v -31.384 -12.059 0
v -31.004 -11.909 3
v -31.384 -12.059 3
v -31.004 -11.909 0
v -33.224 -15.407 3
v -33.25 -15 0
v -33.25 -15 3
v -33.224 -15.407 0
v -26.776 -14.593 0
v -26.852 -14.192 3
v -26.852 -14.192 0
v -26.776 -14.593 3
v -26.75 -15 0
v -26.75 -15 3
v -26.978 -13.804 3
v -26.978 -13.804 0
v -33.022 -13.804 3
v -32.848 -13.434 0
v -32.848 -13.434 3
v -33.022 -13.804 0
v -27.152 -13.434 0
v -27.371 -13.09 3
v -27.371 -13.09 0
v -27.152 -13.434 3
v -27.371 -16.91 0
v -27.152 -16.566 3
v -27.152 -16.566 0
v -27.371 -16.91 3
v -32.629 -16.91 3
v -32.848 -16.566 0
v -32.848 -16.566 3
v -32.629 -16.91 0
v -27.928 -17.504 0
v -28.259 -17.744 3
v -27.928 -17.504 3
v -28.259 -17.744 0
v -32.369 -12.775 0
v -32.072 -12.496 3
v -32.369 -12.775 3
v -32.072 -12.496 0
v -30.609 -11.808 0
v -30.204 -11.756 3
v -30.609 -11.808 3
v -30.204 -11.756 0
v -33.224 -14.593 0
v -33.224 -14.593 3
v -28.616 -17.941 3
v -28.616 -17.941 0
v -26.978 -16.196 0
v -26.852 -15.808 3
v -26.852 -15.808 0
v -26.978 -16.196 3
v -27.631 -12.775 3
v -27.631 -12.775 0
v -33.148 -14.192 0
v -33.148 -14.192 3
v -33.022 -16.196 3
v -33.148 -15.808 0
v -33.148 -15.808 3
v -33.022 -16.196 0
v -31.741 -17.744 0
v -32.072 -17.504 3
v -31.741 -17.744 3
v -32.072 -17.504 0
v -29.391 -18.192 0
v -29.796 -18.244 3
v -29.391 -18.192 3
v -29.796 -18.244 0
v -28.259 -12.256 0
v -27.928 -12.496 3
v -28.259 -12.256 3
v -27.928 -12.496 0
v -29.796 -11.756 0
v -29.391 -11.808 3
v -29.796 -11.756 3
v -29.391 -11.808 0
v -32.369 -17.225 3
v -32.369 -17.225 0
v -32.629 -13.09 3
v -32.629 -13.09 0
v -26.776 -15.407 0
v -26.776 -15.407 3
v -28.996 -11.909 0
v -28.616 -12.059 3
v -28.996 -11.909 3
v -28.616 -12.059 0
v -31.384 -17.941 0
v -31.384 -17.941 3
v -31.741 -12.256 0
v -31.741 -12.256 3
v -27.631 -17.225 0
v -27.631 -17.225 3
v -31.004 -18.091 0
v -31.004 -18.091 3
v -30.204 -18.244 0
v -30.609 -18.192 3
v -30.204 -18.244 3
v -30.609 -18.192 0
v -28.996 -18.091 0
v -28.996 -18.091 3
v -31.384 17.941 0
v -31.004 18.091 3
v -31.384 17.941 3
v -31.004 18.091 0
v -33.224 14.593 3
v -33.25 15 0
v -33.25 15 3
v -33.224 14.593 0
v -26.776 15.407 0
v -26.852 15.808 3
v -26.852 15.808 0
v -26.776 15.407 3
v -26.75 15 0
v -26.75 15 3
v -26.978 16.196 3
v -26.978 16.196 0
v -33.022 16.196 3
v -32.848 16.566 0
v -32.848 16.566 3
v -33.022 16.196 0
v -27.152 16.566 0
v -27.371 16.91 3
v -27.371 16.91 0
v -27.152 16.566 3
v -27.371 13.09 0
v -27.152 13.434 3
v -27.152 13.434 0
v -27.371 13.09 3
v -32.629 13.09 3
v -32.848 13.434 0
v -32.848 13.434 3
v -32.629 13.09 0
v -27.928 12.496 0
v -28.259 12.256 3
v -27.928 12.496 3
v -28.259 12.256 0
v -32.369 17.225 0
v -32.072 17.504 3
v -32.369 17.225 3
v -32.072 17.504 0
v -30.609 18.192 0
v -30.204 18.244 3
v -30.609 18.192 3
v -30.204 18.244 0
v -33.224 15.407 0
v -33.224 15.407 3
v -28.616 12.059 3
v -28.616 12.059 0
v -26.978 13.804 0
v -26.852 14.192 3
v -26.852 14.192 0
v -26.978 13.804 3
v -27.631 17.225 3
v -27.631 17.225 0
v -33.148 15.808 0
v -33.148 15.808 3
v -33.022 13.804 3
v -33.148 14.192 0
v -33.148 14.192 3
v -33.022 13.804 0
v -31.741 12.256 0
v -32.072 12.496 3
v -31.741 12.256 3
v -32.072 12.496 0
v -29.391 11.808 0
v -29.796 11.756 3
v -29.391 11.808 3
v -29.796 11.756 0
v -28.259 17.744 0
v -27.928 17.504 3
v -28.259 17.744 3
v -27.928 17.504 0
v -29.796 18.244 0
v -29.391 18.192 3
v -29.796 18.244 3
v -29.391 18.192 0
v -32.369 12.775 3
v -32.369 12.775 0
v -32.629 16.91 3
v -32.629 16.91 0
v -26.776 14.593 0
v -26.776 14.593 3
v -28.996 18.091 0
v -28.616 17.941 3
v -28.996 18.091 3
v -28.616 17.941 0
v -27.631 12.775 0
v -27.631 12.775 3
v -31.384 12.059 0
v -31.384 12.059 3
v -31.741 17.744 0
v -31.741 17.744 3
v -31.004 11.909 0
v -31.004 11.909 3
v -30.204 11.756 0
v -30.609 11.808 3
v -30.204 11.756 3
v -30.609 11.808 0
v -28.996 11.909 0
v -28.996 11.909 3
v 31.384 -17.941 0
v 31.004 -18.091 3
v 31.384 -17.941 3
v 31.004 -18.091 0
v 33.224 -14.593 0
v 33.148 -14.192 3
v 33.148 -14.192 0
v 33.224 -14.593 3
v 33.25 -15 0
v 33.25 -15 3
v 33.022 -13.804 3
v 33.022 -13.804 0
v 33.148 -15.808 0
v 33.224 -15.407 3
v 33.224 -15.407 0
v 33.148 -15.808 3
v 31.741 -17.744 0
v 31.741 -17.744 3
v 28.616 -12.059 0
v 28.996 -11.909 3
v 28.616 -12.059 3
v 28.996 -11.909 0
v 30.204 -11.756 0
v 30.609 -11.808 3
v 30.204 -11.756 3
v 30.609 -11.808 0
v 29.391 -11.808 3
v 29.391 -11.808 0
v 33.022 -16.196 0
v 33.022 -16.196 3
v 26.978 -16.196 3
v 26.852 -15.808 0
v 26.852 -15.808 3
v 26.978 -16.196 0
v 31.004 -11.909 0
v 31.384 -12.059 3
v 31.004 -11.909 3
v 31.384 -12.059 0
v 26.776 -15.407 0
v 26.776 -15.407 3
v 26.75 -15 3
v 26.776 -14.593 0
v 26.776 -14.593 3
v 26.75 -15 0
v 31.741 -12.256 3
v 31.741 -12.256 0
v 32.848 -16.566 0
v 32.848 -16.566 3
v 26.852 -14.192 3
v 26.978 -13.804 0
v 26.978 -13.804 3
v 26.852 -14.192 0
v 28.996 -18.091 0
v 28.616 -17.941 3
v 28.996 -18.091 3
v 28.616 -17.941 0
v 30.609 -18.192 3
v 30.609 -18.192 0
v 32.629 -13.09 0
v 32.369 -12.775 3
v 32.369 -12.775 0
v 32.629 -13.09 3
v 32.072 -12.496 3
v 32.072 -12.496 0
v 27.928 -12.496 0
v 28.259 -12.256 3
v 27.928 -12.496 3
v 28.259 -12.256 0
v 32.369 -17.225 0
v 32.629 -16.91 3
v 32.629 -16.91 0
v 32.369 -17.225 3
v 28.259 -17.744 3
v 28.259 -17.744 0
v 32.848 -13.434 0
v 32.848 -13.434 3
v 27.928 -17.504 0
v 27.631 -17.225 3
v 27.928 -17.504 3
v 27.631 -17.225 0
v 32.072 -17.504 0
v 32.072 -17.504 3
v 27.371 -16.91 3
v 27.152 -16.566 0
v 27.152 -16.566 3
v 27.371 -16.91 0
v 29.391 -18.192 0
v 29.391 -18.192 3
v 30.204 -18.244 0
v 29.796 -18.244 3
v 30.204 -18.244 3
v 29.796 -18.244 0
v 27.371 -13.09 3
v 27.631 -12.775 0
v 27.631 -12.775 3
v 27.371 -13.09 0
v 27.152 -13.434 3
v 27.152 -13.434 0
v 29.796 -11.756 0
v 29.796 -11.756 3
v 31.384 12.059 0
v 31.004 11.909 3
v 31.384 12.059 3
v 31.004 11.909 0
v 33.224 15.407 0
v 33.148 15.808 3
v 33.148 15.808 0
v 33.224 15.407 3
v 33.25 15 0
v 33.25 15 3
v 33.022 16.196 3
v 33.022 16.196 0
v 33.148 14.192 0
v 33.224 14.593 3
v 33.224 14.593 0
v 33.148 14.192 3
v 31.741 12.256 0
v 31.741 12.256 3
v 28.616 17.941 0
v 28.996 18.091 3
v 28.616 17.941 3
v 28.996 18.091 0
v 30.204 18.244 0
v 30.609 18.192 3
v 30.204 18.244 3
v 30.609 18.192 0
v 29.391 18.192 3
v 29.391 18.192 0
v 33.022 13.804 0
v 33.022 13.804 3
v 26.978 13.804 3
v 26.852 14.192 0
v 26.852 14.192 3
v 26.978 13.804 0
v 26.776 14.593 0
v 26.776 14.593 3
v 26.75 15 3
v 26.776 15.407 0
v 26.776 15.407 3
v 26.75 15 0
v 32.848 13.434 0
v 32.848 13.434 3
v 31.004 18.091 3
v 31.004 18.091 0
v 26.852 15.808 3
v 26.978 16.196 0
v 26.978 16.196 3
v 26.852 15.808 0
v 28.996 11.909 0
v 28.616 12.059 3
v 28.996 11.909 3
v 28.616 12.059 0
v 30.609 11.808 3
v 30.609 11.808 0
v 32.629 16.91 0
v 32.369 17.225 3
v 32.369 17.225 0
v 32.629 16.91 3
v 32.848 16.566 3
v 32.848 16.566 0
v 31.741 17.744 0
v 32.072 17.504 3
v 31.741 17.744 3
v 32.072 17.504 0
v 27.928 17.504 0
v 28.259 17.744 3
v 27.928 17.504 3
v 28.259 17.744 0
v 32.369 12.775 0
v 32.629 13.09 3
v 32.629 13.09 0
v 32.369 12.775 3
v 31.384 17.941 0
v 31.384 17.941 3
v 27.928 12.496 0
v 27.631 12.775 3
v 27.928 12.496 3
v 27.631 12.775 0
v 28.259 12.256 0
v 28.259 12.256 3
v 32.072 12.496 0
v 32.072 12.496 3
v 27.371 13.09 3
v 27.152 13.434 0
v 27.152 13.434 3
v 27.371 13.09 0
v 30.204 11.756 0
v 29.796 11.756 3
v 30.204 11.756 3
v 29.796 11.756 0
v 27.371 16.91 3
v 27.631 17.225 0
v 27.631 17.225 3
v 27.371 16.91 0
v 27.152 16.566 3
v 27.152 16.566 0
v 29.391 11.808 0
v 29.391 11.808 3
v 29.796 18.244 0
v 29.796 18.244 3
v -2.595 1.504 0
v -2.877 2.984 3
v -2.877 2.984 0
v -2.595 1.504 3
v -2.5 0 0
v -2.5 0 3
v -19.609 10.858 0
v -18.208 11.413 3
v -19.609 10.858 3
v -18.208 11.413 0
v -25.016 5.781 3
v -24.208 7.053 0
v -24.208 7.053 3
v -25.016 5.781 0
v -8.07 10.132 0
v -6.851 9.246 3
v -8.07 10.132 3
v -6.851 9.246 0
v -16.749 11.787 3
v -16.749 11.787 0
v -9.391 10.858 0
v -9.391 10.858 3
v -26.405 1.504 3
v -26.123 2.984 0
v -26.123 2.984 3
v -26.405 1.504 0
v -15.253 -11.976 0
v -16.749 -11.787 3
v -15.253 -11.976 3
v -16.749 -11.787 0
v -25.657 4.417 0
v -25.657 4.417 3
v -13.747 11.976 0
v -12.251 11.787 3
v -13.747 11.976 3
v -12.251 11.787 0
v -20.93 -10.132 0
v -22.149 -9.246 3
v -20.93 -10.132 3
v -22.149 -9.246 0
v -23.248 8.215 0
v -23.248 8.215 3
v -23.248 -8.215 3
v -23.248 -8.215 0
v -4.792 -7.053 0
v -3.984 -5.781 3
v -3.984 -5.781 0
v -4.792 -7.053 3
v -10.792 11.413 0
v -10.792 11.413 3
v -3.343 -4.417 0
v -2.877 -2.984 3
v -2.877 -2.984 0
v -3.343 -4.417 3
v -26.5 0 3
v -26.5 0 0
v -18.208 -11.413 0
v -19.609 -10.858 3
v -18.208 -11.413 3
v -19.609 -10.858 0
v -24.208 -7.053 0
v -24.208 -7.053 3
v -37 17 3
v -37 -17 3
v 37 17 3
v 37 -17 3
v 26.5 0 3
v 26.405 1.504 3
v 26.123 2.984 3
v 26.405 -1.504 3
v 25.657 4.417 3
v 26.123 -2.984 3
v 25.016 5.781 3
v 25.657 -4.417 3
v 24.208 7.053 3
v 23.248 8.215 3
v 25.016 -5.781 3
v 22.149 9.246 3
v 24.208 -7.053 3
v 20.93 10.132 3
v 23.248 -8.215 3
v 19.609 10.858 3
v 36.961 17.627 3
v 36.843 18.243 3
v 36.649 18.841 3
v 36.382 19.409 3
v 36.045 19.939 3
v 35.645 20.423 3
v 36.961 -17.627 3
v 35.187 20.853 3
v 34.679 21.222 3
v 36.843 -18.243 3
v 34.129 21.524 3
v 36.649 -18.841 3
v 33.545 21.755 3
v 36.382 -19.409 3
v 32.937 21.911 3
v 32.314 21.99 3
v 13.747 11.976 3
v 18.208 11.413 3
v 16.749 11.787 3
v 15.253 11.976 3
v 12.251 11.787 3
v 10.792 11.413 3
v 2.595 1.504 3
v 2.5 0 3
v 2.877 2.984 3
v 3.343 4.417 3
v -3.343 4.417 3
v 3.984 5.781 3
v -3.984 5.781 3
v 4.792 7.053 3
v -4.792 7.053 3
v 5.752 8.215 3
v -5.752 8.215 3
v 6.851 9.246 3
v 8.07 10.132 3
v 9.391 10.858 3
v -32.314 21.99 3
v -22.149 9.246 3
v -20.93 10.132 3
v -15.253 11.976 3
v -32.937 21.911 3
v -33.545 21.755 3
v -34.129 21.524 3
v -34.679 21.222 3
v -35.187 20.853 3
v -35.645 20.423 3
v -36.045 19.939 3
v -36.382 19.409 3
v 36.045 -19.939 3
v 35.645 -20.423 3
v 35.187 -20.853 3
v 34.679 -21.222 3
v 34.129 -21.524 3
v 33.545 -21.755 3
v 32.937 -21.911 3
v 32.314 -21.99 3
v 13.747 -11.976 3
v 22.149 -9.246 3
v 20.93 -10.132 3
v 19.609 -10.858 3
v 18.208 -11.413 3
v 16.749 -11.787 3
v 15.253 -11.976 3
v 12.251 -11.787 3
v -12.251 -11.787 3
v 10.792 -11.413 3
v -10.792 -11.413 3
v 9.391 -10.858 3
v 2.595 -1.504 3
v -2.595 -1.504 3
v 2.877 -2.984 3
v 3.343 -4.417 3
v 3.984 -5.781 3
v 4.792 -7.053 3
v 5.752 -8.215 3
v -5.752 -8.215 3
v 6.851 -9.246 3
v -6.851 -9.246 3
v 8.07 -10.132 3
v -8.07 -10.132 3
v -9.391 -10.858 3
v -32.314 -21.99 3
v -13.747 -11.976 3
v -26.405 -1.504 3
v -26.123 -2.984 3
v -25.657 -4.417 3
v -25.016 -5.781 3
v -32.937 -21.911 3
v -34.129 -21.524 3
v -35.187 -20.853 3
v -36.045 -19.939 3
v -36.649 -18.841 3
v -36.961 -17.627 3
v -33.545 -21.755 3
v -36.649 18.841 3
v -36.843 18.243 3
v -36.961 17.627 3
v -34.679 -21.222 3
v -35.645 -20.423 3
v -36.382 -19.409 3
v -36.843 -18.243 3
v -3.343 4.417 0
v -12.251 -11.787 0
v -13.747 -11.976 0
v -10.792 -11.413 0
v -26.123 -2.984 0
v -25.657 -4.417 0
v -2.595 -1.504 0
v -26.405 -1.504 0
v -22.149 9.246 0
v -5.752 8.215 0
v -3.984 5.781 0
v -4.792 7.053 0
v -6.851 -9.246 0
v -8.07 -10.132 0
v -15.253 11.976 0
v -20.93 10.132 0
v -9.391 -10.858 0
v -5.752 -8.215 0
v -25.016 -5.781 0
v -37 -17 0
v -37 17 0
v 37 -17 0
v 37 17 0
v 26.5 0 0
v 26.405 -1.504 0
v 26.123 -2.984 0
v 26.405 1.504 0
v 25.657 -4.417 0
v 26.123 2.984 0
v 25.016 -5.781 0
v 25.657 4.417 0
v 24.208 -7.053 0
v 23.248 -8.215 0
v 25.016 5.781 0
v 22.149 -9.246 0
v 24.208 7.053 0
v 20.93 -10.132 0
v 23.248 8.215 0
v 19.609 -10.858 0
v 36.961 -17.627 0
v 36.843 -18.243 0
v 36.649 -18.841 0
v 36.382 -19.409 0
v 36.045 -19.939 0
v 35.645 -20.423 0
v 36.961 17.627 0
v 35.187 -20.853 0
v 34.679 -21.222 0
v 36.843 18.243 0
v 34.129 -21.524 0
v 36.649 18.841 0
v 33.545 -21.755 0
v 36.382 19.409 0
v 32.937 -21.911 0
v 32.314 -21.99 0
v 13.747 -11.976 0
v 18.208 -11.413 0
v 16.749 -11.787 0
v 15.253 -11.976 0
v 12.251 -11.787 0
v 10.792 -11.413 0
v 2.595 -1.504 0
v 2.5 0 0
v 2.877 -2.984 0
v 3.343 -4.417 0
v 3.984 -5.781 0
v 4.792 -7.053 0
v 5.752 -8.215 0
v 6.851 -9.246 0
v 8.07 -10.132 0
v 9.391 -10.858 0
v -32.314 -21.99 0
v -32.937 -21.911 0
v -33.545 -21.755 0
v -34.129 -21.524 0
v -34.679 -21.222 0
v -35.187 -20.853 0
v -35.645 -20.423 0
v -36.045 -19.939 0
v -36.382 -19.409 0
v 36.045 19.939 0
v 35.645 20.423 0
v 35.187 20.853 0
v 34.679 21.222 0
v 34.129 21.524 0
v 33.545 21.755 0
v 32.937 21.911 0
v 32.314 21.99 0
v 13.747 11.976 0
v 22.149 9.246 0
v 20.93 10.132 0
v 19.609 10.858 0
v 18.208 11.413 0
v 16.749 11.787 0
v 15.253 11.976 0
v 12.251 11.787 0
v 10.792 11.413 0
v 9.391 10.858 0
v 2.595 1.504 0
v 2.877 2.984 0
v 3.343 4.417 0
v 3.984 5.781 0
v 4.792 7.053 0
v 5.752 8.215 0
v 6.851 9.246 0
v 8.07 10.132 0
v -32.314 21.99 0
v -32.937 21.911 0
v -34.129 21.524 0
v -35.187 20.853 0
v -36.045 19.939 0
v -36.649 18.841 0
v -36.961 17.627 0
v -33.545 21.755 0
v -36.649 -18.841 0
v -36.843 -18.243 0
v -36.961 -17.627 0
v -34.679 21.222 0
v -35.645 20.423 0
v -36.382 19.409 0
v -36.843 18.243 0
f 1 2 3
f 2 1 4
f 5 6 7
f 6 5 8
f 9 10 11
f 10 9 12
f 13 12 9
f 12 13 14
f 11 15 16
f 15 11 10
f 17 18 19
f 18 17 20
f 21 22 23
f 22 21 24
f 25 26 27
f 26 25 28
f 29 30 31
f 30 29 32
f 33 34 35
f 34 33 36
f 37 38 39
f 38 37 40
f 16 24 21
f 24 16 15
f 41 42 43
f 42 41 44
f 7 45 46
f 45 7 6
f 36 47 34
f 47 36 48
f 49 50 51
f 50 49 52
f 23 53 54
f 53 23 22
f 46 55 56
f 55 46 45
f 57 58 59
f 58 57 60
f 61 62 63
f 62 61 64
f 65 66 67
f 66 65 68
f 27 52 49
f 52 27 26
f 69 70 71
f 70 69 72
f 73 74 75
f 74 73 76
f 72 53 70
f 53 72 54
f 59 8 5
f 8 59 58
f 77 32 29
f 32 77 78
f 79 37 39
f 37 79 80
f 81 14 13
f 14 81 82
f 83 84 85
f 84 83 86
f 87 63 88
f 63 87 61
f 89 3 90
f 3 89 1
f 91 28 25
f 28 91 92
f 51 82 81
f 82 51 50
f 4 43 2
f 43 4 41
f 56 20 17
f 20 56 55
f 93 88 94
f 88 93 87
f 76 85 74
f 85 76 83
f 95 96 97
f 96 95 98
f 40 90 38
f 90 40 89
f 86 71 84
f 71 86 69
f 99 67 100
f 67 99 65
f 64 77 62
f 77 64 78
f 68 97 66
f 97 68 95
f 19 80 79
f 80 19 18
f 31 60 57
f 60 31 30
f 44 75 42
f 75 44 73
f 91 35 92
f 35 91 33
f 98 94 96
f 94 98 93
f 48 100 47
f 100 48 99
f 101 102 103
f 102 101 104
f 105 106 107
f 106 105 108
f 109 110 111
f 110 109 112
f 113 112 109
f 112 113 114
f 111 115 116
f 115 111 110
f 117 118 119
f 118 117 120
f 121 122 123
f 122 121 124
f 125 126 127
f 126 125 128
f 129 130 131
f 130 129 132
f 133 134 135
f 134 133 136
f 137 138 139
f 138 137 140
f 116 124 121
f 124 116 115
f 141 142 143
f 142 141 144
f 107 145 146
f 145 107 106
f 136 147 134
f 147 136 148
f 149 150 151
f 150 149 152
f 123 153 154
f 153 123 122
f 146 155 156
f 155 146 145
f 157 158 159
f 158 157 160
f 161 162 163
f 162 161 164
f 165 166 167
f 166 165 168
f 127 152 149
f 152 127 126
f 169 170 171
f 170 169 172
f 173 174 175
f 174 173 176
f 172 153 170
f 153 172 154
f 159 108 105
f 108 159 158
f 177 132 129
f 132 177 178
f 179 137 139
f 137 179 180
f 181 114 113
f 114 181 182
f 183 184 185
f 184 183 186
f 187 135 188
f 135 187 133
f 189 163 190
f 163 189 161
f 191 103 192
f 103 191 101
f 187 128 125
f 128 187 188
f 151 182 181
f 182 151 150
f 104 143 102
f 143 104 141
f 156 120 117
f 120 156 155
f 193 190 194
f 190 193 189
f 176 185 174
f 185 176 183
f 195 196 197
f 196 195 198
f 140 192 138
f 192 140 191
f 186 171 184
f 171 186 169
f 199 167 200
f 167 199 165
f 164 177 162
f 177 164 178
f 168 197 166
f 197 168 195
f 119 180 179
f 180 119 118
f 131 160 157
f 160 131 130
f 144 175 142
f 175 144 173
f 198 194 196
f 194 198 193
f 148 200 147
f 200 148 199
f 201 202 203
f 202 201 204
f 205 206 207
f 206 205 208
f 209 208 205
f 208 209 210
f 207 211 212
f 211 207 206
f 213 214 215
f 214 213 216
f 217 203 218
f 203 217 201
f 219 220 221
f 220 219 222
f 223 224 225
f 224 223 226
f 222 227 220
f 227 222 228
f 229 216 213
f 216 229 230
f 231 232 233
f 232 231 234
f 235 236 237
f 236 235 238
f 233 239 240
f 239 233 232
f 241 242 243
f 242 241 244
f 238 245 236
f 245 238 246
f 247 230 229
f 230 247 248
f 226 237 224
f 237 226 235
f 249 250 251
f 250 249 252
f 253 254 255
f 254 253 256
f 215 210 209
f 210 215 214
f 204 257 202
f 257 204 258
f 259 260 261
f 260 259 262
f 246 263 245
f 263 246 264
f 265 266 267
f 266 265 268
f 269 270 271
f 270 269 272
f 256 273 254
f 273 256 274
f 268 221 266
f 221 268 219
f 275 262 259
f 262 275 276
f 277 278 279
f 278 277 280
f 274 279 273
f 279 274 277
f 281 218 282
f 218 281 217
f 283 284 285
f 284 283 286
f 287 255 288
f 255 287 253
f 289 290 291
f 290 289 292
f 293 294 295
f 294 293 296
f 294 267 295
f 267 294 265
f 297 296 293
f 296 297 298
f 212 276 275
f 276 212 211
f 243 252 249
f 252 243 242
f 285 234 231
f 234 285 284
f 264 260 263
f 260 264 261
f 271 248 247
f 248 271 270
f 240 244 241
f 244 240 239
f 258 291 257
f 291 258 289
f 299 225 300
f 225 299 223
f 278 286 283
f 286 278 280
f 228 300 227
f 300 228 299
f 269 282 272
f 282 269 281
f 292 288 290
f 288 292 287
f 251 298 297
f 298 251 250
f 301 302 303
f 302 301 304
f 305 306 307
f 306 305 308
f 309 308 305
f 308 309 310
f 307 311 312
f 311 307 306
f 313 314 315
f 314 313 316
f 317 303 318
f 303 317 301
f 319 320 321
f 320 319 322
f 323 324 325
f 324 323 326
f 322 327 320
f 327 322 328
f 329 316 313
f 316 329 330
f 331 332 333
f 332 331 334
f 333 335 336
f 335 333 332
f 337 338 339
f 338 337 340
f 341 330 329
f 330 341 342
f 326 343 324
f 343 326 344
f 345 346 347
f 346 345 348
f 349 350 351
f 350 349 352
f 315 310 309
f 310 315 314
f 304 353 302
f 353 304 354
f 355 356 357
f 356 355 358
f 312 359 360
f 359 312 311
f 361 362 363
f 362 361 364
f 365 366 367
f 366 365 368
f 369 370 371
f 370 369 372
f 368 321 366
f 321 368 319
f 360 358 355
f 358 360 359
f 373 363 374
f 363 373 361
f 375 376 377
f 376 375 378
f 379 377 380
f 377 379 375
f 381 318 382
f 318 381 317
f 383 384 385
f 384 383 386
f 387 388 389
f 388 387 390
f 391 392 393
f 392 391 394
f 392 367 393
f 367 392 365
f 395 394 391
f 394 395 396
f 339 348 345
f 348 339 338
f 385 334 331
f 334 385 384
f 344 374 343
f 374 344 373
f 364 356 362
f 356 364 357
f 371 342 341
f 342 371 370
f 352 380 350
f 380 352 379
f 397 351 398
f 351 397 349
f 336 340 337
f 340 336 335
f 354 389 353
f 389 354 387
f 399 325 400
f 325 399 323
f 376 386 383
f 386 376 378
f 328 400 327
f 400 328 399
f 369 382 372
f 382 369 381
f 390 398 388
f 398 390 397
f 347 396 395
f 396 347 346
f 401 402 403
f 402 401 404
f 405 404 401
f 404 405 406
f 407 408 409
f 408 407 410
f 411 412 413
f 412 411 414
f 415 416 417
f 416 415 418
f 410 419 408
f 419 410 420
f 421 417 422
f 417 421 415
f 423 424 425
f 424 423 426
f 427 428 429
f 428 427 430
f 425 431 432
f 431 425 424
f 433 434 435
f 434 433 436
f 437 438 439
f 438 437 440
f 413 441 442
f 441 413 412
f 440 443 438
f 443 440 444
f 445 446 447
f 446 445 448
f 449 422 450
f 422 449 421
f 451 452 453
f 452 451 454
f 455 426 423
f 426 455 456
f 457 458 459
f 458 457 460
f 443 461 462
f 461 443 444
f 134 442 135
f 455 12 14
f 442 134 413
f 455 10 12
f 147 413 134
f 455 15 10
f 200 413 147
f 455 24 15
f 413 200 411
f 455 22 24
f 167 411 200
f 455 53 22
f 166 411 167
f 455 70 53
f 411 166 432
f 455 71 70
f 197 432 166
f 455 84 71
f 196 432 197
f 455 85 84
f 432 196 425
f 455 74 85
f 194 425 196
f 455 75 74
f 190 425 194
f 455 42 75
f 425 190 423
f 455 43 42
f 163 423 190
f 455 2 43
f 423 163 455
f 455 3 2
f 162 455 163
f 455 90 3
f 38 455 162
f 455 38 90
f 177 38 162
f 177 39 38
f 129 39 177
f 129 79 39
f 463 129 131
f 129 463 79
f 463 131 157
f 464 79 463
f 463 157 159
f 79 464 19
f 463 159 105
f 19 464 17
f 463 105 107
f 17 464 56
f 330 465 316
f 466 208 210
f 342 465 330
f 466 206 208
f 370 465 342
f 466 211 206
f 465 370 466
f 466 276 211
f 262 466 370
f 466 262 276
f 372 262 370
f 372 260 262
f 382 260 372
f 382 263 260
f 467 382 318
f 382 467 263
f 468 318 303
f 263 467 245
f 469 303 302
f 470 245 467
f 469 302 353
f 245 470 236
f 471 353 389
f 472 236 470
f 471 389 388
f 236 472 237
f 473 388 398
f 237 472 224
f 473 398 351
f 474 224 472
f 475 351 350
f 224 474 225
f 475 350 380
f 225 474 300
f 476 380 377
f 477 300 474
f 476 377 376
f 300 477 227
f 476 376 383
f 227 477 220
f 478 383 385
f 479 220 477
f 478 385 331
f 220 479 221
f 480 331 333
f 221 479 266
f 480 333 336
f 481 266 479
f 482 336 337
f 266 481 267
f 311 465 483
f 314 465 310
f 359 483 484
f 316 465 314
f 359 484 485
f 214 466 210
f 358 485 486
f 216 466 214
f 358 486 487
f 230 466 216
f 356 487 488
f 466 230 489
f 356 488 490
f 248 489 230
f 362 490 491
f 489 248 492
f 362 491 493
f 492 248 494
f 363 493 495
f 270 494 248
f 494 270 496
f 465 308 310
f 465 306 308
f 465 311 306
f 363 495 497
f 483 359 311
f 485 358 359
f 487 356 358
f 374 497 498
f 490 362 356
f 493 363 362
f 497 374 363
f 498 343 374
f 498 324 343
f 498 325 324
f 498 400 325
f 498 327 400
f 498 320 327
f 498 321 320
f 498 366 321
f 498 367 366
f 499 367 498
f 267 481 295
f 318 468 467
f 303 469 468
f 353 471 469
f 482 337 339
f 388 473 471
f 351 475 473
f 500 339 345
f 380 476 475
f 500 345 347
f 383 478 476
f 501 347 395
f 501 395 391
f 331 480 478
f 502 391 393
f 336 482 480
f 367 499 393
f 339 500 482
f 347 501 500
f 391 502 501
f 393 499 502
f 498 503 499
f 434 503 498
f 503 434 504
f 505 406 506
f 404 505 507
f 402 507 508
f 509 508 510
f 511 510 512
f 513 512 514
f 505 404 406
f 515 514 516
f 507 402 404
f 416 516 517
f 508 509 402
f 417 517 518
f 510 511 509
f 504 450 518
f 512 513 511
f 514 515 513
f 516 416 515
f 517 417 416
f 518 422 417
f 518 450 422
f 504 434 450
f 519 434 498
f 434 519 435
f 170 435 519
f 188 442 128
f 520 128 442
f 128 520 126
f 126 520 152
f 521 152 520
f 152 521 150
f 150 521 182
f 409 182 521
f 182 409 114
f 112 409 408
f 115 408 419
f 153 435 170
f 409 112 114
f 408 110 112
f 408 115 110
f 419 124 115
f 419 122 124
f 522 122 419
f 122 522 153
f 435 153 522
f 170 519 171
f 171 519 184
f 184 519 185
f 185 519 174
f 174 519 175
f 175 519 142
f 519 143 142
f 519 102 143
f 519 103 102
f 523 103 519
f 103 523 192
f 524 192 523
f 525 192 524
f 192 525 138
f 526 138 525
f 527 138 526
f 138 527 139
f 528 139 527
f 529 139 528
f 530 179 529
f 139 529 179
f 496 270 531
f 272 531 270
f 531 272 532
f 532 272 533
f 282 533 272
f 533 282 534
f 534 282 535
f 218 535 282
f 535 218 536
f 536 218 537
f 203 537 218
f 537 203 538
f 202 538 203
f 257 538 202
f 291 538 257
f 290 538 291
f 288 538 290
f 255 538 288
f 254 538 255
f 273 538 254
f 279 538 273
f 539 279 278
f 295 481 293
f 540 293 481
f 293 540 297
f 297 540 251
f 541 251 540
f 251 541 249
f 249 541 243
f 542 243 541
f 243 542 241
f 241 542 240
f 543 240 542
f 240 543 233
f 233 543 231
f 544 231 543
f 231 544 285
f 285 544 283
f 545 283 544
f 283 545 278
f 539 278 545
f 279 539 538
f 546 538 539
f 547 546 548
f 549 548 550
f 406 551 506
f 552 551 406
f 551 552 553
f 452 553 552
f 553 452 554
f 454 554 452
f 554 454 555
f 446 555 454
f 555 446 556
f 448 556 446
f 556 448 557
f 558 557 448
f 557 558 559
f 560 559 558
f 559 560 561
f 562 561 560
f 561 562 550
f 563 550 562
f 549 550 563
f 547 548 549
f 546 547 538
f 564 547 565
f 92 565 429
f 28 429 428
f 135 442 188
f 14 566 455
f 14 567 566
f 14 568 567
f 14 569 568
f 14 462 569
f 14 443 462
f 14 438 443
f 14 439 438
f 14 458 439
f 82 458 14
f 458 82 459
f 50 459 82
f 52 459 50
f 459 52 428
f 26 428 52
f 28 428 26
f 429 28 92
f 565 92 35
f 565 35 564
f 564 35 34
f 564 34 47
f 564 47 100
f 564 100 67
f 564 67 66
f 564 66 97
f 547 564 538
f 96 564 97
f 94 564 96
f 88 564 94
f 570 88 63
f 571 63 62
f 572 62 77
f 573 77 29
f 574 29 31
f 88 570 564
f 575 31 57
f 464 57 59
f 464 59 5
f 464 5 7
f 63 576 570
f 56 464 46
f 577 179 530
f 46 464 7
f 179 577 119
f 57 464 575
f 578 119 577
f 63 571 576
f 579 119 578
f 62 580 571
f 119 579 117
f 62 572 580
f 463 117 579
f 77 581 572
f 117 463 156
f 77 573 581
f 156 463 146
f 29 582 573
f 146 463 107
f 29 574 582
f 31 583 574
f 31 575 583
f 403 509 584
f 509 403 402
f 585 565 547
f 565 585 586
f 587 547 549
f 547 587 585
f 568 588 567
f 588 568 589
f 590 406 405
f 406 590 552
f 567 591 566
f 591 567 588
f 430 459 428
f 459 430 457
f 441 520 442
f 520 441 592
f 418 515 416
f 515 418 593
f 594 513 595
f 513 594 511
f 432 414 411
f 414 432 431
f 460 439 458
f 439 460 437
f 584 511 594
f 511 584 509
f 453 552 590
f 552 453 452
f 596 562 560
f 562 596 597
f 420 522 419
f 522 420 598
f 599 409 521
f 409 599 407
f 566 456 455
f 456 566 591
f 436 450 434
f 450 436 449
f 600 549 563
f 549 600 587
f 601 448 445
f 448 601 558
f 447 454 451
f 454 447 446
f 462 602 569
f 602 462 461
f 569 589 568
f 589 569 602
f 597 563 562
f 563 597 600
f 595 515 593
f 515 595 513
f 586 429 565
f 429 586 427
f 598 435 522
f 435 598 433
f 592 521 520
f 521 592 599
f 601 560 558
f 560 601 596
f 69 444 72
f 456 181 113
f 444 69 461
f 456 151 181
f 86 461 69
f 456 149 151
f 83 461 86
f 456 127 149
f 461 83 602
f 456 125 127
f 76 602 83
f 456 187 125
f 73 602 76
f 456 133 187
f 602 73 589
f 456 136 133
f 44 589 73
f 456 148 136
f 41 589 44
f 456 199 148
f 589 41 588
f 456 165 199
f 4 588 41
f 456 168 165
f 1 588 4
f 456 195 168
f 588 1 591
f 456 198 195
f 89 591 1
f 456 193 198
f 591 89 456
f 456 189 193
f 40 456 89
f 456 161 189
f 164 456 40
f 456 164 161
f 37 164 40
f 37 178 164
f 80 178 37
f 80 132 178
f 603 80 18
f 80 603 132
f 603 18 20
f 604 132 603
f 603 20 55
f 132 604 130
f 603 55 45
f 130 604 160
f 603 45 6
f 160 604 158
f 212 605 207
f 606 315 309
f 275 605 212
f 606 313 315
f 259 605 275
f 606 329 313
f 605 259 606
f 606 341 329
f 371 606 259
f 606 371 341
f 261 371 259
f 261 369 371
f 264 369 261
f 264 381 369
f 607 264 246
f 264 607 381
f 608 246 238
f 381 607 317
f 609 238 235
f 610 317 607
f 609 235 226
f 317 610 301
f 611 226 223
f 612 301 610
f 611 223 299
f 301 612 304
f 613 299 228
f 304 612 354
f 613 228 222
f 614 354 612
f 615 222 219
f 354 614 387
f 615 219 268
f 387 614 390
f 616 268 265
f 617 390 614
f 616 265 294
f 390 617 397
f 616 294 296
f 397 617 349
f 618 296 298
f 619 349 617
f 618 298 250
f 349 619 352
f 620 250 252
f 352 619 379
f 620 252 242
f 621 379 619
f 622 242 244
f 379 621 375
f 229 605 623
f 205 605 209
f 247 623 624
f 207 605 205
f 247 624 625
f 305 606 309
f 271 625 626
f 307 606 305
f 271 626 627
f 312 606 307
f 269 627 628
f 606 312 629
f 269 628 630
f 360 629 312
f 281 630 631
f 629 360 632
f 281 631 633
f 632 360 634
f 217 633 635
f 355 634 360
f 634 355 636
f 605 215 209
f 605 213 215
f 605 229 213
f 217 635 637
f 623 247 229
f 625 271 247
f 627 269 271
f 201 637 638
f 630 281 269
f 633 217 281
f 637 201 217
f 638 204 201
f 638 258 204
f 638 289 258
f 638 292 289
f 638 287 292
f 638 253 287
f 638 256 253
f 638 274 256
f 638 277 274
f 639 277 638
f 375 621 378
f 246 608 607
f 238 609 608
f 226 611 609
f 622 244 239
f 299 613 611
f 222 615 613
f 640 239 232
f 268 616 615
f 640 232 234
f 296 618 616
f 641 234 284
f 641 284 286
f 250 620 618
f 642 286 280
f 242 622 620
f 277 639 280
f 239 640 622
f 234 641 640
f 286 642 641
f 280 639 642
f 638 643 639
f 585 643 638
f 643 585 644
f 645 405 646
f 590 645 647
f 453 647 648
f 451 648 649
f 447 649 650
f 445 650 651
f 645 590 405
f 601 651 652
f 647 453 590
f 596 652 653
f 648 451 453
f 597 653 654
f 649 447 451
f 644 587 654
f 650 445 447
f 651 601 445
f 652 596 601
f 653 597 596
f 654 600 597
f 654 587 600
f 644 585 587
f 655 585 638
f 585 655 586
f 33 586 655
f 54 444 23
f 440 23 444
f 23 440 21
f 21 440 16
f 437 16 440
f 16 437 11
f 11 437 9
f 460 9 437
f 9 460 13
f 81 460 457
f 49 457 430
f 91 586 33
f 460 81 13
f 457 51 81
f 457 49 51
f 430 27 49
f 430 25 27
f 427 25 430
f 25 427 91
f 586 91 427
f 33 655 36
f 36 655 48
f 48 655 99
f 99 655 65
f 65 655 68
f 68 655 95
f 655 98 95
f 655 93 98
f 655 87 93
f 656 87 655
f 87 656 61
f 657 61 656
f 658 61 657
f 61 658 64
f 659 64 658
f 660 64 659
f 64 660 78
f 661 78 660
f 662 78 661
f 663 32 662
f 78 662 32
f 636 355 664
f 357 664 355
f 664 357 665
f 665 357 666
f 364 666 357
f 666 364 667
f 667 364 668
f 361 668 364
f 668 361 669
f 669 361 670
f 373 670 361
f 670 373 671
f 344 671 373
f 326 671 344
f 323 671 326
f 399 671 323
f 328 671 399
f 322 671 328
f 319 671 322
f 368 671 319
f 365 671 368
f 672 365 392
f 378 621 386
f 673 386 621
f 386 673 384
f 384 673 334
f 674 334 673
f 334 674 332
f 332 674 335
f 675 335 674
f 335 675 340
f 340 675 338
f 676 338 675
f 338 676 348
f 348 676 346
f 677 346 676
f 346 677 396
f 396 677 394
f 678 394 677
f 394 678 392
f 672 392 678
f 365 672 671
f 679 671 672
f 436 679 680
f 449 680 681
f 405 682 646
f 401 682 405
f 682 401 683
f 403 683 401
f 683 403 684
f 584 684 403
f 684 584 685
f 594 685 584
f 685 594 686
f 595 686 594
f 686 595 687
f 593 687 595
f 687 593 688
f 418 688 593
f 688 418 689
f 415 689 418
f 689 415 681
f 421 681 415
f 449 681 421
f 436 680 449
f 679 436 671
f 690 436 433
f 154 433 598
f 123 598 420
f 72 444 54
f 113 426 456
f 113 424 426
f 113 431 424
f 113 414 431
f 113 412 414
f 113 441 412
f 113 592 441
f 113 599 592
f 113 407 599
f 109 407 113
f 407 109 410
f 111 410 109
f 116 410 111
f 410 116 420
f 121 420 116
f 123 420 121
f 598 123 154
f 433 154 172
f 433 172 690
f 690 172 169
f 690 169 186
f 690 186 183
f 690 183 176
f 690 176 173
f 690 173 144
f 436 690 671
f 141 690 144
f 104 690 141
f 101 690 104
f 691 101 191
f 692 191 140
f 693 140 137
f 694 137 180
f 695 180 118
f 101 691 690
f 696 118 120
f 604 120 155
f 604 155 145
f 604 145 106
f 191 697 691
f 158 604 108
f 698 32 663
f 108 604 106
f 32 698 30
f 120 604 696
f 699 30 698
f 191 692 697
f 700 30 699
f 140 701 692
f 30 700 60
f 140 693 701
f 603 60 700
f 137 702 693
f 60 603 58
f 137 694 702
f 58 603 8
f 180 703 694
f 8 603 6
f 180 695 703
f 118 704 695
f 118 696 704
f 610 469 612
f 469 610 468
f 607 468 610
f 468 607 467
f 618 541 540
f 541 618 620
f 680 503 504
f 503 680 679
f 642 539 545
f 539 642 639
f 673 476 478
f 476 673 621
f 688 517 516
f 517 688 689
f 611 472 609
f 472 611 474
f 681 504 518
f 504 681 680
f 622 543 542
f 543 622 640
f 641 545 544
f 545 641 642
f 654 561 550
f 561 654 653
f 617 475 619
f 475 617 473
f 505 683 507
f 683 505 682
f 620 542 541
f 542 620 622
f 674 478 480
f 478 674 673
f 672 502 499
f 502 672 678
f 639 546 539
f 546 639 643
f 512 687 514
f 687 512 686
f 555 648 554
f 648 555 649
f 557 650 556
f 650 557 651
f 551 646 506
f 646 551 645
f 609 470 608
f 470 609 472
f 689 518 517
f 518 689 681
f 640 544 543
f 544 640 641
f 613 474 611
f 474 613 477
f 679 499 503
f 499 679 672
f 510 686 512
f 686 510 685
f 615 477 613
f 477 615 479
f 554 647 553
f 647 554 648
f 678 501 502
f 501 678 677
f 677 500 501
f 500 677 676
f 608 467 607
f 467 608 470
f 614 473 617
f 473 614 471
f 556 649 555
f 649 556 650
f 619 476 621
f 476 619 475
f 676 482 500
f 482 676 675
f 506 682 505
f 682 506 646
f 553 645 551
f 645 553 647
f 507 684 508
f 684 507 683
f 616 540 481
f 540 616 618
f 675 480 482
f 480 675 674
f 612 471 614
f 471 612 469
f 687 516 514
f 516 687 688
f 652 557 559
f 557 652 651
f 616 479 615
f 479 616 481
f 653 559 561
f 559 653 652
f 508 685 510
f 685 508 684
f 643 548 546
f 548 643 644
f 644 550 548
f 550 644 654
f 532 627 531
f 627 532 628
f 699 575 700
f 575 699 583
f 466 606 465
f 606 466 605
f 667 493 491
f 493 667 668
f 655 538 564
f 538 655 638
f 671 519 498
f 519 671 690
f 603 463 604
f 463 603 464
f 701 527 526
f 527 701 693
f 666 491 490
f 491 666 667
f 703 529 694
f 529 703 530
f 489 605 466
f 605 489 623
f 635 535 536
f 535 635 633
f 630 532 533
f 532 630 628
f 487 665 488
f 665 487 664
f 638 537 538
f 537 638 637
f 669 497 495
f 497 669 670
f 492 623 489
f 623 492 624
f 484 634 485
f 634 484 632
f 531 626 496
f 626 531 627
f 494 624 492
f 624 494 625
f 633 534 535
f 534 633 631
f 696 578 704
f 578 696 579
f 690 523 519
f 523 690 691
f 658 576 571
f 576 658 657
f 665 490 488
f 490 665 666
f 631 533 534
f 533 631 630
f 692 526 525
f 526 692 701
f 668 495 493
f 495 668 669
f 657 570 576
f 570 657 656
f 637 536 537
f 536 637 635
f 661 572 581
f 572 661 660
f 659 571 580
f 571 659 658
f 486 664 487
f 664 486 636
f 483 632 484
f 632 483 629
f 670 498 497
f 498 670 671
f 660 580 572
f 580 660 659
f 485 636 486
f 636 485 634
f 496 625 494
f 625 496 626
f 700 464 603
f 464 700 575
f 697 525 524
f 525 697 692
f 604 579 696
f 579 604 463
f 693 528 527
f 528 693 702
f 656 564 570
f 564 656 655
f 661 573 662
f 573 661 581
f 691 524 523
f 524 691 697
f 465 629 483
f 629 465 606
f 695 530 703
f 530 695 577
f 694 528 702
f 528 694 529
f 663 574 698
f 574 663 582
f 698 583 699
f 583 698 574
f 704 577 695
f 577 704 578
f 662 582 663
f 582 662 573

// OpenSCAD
$fn = 50;


difference() {
	union() {
		hull() {
			translate(v = [-32.0000000000, 17.0000000000, 0]) {
				cylinder(h = 3, r = 5);
			}
			translate(v = [32.0000000000, 17.0000000000, 0]) {
				cylinder(h = 3, r = 5);
			}
			translate(v = [-32.0000000000, -17.0000000000, 0]) {
				cylinder(h = 3, r = 5);
			}
			translate(v = [32.0000000000, -17.0000000000, 0]) {
				cylinder(h = 3, r = 5);
			}
		}
	}
	union() {
		#translate(v = [-30.0000000000, -15.0000000000, -100.0000000000]) {
			cylinder(h = 200, r = 3.2500000000);
		}
		#translate(v = [-30.0000000000, 15.0000000000, -100.0000000000]) {
			cylinder(h = 200, r = 3.2500000000);
		}
		#translate(v = [30.0000000000, -15.0000000000, -100.0000000000]) {
			cylinder(h = 200, r = 3.2500000000);
		}
		#translate(v = [30.0000000000, 15.0000000000, -100.0000000000]) {
			cylinder(h = 200, r = 3.2500000000);
		}
		#translate(v = [-14.5000000000, 0, 0]) {
			cylinder(h = 3, r = 12.0000000000);
		}
		#translate(v = [14.5000000000, 0, 0]) {
			cylinder(h = 3, r = 12.0000000000);
		}
	}
}
